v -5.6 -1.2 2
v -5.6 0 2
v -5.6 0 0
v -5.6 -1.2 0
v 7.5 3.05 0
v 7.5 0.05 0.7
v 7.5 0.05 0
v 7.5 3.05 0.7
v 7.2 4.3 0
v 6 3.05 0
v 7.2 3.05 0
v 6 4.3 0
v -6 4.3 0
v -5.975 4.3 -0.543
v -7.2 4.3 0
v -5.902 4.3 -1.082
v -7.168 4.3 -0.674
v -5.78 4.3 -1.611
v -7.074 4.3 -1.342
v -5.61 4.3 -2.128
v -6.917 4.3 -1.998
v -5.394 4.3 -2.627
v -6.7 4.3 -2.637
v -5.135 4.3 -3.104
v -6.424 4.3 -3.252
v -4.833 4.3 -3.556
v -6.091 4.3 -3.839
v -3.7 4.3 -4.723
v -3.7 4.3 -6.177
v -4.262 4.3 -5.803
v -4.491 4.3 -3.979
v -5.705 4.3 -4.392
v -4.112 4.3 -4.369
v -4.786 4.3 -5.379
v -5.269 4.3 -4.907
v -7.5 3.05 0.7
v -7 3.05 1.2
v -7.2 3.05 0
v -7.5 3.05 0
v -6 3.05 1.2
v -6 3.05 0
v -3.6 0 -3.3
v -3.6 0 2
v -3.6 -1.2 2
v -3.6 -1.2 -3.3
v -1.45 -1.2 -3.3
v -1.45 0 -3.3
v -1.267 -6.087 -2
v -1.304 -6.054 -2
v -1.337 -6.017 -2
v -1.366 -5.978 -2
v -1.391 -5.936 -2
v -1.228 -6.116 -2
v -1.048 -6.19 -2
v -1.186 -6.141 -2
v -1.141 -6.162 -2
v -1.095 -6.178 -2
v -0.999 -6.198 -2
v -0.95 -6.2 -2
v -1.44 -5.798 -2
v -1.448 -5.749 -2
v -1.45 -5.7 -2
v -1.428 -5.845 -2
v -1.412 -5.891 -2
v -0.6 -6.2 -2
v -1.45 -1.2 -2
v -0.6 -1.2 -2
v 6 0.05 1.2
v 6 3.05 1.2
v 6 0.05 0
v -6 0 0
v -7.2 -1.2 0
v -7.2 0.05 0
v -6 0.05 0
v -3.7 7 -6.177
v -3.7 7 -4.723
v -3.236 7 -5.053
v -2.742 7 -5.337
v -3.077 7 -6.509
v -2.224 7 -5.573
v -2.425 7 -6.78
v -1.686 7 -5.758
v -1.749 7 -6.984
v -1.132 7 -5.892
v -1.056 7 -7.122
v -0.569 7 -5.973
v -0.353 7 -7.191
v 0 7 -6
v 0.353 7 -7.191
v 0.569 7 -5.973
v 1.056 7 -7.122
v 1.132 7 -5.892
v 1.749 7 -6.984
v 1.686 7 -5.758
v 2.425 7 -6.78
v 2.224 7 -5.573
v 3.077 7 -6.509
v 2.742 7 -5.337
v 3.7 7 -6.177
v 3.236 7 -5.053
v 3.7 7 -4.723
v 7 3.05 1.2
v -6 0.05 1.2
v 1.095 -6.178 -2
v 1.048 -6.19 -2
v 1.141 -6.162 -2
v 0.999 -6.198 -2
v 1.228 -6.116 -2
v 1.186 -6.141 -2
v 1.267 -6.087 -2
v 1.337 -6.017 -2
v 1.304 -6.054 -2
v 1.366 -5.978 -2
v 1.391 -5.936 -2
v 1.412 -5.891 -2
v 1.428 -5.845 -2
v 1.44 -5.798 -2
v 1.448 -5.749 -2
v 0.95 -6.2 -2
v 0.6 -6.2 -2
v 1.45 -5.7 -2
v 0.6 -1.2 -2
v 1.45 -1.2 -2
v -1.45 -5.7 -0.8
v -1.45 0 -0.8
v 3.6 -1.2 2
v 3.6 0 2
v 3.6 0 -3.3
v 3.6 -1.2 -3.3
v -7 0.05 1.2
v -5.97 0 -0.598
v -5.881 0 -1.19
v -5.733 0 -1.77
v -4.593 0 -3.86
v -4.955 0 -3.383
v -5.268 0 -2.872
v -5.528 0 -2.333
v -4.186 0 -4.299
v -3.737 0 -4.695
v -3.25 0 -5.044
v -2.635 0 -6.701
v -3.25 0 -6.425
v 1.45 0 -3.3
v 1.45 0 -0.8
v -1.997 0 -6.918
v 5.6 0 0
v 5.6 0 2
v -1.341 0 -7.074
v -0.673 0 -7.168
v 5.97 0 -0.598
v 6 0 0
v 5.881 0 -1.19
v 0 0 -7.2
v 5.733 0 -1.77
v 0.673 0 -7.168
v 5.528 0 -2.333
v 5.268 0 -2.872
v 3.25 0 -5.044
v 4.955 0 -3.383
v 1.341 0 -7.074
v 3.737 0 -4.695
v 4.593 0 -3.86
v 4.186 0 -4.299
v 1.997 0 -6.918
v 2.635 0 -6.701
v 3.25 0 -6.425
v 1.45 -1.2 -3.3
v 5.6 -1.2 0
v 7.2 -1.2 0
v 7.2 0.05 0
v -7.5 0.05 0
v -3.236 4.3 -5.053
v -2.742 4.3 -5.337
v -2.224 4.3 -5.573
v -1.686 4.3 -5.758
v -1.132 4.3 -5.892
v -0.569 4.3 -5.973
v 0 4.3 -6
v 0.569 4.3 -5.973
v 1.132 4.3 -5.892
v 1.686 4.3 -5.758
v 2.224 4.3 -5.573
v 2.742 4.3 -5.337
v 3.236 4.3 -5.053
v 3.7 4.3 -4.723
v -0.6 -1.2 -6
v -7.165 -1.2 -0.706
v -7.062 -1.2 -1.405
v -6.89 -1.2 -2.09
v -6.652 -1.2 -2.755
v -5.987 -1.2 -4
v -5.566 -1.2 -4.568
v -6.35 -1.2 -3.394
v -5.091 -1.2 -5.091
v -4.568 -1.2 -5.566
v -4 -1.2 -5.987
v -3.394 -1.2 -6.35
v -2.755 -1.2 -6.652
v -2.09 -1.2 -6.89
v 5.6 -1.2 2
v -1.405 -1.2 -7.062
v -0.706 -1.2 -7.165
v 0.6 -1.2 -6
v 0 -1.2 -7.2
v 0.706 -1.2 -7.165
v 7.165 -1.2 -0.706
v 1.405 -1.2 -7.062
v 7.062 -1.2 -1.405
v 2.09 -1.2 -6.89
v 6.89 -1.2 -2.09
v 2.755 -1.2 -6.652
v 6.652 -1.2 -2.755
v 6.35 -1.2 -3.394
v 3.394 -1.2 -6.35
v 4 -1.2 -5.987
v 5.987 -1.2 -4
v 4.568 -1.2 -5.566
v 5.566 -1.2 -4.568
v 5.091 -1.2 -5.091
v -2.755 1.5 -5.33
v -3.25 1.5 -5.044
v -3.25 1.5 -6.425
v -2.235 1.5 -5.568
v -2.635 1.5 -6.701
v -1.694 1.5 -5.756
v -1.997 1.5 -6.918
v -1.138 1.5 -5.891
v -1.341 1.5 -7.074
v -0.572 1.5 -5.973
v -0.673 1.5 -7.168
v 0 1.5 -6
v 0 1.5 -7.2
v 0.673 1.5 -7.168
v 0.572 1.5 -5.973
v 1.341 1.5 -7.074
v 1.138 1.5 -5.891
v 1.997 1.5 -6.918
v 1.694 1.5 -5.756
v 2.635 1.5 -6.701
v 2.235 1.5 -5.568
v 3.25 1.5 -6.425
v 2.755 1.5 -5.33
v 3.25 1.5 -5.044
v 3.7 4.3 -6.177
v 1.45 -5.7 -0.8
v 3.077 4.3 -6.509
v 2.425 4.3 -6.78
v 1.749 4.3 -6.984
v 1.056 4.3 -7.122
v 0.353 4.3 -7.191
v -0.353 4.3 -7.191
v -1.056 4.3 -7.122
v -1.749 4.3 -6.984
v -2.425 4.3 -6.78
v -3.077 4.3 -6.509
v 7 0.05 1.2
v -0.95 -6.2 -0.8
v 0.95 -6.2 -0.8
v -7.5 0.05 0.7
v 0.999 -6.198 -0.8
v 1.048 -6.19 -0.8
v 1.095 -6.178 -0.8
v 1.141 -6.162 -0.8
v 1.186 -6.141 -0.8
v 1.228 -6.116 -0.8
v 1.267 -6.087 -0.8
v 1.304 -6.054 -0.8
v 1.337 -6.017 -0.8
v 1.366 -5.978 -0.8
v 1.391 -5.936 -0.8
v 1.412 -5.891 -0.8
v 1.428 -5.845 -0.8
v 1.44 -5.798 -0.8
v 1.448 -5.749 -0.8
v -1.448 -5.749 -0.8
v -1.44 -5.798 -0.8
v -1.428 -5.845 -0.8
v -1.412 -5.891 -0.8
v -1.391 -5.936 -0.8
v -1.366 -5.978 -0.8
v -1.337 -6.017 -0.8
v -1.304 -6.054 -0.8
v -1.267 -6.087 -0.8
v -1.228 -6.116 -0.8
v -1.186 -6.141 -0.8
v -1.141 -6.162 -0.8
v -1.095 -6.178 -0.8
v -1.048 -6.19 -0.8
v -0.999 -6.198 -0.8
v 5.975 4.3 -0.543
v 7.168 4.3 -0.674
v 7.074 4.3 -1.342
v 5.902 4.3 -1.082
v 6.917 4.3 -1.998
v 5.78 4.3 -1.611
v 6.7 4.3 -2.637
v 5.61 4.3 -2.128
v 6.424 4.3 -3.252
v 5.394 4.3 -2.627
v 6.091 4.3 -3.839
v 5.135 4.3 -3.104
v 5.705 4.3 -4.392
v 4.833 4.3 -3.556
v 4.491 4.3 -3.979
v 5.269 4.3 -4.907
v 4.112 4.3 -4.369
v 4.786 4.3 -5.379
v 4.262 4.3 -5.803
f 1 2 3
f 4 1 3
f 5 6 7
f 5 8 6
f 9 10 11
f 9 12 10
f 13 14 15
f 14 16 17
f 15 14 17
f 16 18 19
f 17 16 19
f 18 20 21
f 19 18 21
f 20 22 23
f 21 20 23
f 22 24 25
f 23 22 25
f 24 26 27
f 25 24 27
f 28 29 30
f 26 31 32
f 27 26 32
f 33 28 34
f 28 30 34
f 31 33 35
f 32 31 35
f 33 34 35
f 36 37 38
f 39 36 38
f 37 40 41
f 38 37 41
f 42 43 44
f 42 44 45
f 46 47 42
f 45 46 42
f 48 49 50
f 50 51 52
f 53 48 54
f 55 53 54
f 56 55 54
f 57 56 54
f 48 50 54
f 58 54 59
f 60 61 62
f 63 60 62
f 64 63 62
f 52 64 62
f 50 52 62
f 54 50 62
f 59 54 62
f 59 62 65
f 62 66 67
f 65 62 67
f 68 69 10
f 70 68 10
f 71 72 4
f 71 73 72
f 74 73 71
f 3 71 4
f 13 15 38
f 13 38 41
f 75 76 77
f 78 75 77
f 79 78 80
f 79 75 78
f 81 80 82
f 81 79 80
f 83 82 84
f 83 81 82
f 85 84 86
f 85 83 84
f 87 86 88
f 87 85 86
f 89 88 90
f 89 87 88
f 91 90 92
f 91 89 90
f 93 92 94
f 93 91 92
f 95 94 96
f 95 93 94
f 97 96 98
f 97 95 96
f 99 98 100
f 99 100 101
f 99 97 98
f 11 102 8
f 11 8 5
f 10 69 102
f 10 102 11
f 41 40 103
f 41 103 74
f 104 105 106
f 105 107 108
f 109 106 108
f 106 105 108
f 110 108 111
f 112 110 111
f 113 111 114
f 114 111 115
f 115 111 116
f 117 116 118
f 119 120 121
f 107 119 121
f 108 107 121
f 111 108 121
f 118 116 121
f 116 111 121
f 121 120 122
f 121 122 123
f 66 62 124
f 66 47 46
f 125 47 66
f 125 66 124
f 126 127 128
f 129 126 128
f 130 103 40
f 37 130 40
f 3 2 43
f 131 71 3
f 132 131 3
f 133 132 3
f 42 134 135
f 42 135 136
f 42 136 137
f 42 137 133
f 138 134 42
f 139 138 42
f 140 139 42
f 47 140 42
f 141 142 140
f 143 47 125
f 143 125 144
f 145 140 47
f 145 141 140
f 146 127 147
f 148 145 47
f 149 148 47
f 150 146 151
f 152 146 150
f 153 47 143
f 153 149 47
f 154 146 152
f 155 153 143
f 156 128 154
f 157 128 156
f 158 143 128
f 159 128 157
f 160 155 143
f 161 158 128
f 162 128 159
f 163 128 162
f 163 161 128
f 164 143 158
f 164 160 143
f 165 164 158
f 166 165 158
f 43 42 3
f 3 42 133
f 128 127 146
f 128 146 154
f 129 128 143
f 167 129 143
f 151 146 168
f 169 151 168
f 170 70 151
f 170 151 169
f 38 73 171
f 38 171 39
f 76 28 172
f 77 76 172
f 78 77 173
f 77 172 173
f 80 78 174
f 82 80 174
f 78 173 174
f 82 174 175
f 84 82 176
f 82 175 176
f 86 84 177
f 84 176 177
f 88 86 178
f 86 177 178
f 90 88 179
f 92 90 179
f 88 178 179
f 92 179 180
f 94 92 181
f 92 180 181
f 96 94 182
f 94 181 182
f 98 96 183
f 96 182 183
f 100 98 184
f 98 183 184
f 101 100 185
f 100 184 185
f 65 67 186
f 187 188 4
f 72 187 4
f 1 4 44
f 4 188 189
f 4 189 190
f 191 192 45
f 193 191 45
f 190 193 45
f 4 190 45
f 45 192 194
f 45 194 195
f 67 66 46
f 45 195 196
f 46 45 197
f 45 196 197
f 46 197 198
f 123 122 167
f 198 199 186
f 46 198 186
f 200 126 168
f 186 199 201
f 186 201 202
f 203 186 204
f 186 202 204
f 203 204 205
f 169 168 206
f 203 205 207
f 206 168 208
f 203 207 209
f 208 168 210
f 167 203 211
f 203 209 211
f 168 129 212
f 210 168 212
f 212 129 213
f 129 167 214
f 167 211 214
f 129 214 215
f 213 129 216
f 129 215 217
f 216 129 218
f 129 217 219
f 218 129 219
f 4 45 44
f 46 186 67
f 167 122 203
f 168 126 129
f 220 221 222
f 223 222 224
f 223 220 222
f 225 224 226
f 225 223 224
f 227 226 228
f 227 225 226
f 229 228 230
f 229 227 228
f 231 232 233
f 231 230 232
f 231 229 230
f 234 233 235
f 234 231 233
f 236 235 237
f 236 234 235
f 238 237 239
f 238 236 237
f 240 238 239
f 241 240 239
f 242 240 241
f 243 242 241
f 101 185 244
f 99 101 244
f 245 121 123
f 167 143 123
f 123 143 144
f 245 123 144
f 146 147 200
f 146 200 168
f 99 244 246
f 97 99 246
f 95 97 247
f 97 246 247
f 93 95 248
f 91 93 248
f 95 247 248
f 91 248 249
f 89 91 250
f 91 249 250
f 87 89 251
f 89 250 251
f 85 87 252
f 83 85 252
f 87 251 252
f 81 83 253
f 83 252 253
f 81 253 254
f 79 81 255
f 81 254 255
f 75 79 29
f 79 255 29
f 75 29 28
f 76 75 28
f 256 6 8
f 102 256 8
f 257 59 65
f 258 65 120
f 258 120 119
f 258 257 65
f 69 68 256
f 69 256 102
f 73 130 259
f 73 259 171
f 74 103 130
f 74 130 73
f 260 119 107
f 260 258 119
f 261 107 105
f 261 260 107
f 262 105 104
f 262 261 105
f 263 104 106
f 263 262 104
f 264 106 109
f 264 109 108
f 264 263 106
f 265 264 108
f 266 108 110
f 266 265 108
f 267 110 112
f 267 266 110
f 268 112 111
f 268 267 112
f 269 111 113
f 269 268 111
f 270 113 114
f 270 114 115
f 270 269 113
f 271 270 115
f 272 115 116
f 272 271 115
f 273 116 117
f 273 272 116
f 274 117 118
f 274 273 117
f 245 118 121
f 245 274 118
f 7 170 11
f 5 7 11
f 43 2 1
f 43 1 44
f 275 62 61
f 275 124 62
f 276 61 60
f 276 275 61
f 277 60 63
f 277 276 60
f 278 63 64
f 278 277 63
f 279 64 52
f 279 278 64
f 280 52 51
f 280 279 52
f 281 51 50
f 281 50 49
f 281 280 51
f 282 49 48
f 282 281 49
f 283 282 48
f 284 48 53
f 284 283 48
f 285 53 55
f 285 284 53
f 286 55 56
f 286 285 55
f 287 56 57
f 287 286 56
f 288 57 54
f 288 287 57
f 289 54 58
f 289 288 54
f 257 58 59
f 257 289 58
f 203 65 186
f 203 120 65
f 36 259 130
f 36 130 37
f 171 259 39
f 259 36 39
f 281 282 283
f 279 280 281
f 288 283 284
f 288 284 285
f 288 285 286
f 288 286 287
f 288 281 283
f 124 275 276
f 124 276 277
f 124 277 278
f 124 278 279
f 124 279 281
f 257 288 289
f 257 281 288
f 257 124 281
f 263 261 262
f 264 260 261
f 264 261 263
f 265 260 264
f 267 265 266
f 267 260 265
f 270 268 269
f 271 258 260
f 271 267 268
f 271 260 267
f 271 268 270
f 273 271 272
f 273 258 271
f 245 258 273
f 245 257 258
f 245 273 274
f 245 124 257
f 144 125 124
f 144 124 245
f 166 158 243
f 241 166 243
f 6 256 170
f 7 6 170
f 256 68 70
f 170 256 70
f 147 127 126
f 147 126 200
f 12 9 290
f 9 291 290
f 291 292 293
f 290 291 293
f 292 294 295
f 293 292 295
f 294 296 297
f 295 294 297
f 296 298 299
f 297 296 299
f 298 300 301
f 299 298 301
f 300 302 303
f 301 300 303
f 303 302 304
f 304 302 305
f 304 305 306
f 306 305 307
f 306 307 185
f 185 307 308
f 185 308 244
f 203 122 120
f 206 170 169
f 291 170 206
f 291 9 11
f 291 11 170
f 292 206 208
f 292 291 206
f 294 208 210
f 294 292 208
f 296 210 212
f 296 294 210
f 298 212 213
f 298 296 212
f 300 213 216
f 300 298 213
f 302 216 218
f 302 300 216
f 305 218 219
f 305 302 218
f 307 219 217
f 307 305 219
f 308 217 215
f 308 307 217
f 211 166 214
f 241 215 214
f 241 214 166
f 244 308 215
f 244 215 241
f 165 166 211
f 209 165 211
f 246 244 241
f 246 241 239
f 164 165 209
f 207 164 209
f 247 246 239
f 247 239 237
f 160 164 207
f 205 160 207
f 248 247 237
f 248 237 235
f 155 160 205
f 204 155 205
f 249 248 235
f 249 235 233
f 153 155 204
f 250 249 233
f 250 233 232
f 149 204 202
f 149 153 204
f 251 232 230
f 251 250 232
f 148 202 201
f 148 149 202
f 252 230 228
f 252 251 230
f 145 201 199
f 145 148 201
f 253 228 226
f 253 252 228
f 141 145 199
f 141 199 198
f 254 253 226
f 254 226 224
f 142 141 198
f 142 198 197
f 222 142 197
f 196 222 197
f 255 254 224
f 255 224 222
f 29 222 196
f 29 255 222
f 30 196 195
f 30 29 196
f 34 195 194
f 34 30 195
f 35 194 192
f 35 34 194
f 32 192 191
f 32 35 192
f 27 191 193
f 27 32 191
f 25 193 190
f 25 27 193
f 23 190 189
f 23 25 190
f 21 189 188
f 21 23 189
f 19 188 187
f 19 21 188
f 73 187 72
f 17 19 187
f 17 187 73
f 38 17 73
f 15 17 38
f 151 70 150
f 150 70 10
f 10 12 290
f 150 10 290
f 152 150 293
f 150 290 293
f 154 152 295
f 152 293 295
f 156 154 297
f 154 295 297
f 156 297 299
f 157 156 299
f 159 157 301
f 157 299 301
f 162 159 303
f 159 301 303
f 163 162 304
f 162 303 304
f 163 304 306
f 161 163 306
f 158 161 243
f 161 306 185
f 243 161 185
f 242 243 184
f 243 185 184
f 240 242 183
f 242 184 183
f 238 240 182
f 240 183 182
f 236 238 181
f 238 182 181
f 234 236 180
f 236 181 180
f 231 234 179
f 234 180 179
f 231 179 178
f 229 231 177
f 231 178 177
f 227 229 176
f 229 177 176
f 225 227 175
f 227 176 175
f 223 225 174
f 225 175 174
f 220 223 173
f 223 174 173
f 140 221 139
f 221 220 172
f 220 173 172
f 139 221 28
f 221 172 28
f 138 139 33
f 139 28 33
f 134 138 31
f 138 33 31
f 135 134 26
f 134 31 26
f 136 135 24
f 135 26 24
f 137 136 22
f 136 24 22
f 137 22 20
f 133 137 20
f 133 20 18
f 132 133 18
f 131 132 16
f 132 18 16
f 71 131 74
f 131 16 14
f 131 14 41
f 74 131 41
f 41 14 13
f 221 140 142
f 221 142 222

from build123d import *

# Parameters (mm, degrees)
SKETCH1_W                = 6
SKETCH1_H                = 1.2
SKETCH1_W_2              = 1.2
SKETCH1_H_2              = 4.3
REVOLVE1_ANGLE           = 180
REVOLVE2_START           = 4.3
REVOLVE2_DEPTH           = 2.7
SKETCH3_W                = 6.5
SKETCH3_H                = 1.5
CUT_EXTRUDE1_DEPTH       = 10
CUT_EXTRUDE2_DEPTH       = 10
SKETCH5_W                = 2
SKETCH5_H                = 2
BOSS_EXTRUDE1_DEPTH      = 1.2
SKETCH6_W                = 1.2
SKETCH6_H                = 3
BOSS_EXTRUDE2_DEPTH      = 1.5
CHAMFER1_SIZE            = 0.5
CHAMFER1_OF_MIRROR1_SIZE = 0.5
SKETCH7_W                = 2.9
SKETCH7_H                = 1.2
BOSS_EXTRUDE3_DEPTH      = 5
BOSS_EXTRUDE4_DEPTH      = 0.6
FILLET1_R                = 0.5


# Read off the part's stored shape, not the designer's step: Revolve2
with BuildPart() as part:
    # Sketch1 → Revolve1 (revolve)
    with BuildSketch(Plane.XY):
        with Locations((3, -0.6)):
            Rectangle(SKETCH1_W, SKETCH1_H)
        with Locations((6.6, -0.6)):
            Rectangle(SKETCH1_W_2, SKETCH1_H)
        with Locations((6.6, 2.15)):
            Rectangle(SKETCH1_W_2, SKETCH1_H_2)
    revolve(axis=Axis((0, -1.2, 0), (0, 1, 0)), revolution_arc=REVOLVE1_ANGLE)

    # Revolve2 outline → Revolve2 (add)
    with BuildSketch(Plane(origin=(0, 0, 0), x_dir=(1, 0, 0), z_dir=(0, 1, 0)).offset(REVOLVE2_START)):
        with BuildLine():
            ThreePointArc((3.7, 6.176568627), (0, 7.2), (-3.7, 6.176568627))
            Line((-3.7, 6.176568627), (-3.7, 4.723346271))
            ThreePointArc((-3.7, 4.723346271), (0, 6), (3.7, 4.723346271))
            Line((3.7, 4.723346271), (3.7, 6.176568627))
        make_face()
    extrude(amount=REVOLVE2_DEPTH)

    # Sketch3 → Cut-Extrude1 (cut)
    with BuildSketch(Plane.XY):
        with Locations((0, 0.75)):
            Rectangle(SKETCH3_W, SKETCH3_H)
    extrude(amount=-CUT_EXTRUDE1_DEPTH, mode=Mode.SUBTRACT)

    # Sketch4 → Cut-Extrude2 (cut)
    with BuildSketch(Plane(origin=(0, 0, 0), x_dir=(1, 0, 0), z_dir=(0, 1, 0))):
        Polygon((-1.45, 3.3), (-3.6, 3.3), (-3.6, 0), (3.6, 0), (3.6, 3.3), (1.45, 3.3), (1.45, 0.8), (-1.45, 0.8), align=None)
    extrude(amount=-CUT_EXTRUDE2_DEPTH, mode=Mode.SUBTRACT)

    # Sketch5 → Boss-Extrude1 (add)
    with BuildSketch(Plane(origin=(0, 0, 0), x_dir=(1, 0, 0), z_dir=(0, 1, 0))):
        with Locations((-4.6, -1)):
            Rectangle(SKETCH5_W, SKETCH5_H)
        with Locations((4.6, -1)):
            Rectangle(SKETCH5_W, SKETCH5_H)
    extrude(amount=-BOSS_EXTRUDE1_DEPTH)

    # Sketch6 → Boss-Extrude2 (add)
    with BuildSketch(Plane(origin=(6, 0, 0), x_dir=(0, 0, -1), z_dir=(1, 0, 0))):
        with Locations((-0.6, 1.55)):
            Rectangle(SKETCH6_W, SKETCH6_H)
    boss_extrude2 = extrude(amount=BOSS_EXTRUDE2_DEPTH)

    # Chamfer1
    chamfer1_edges = [part.edges().sort_by_distance(p)[0] for p in [
        (7.5, 1.55, 1.2),
    ]]
    chamfer(chamfer1_edges, length=CHAMFER1_SIZE)

    # Mirror1: Boss-Extrude2 across plane
    add(boss_extrude2.mirror(Plane(origin=(0, 0, 0), x_dir=(0, 0, 1), z_dir=(1, 0, 0))))

    # Chamfer1 of Mirror1
    chamfer1_of_mirror1_edges = [part.edges().sort_by_distance(p)[0] for p in [
        (-7.5, 1.55, 1.2),
    ]]
    chamfer(chamfer1_of_mirror1_edges, length=CHAMFER1_OF_MIRROR1_SIZE)

    # Sketch7 → Boss-Extrude3 (add)
    with BuildSketch(Plane.XZ.offset(1.2)):
        with Locations((0, -1.4)):
            Rectangle(SKETCH7_W, SKETCH7_H)
    extrude(amount=BOSS_EXTRUDE3_DEPTH)

    # Sketch8 → Boss-Extrude4 (add, symmetric)
    with BuildSketch(Plane(origin=(0, 0, 0), x_dir=(0, 0, -1), z_dir=(1, 0, 0))):
        Polygon((2, -6.2), (6, -1.2), (2, -1.2), align=None)
    extrude(amount=BOSS_EXTRUDE4_DEPTH, both=True)

    # Fillet1
    fillet1_edges = [part.edges().sort_by_distance(p)[0] for p in [
        (-1.45, -6.2, -1.4),
        (1.45, -6.2, -1.4),
    ]]
    fillet(fillet1_edges, radius=FILLET1_R)


solid = part.part
